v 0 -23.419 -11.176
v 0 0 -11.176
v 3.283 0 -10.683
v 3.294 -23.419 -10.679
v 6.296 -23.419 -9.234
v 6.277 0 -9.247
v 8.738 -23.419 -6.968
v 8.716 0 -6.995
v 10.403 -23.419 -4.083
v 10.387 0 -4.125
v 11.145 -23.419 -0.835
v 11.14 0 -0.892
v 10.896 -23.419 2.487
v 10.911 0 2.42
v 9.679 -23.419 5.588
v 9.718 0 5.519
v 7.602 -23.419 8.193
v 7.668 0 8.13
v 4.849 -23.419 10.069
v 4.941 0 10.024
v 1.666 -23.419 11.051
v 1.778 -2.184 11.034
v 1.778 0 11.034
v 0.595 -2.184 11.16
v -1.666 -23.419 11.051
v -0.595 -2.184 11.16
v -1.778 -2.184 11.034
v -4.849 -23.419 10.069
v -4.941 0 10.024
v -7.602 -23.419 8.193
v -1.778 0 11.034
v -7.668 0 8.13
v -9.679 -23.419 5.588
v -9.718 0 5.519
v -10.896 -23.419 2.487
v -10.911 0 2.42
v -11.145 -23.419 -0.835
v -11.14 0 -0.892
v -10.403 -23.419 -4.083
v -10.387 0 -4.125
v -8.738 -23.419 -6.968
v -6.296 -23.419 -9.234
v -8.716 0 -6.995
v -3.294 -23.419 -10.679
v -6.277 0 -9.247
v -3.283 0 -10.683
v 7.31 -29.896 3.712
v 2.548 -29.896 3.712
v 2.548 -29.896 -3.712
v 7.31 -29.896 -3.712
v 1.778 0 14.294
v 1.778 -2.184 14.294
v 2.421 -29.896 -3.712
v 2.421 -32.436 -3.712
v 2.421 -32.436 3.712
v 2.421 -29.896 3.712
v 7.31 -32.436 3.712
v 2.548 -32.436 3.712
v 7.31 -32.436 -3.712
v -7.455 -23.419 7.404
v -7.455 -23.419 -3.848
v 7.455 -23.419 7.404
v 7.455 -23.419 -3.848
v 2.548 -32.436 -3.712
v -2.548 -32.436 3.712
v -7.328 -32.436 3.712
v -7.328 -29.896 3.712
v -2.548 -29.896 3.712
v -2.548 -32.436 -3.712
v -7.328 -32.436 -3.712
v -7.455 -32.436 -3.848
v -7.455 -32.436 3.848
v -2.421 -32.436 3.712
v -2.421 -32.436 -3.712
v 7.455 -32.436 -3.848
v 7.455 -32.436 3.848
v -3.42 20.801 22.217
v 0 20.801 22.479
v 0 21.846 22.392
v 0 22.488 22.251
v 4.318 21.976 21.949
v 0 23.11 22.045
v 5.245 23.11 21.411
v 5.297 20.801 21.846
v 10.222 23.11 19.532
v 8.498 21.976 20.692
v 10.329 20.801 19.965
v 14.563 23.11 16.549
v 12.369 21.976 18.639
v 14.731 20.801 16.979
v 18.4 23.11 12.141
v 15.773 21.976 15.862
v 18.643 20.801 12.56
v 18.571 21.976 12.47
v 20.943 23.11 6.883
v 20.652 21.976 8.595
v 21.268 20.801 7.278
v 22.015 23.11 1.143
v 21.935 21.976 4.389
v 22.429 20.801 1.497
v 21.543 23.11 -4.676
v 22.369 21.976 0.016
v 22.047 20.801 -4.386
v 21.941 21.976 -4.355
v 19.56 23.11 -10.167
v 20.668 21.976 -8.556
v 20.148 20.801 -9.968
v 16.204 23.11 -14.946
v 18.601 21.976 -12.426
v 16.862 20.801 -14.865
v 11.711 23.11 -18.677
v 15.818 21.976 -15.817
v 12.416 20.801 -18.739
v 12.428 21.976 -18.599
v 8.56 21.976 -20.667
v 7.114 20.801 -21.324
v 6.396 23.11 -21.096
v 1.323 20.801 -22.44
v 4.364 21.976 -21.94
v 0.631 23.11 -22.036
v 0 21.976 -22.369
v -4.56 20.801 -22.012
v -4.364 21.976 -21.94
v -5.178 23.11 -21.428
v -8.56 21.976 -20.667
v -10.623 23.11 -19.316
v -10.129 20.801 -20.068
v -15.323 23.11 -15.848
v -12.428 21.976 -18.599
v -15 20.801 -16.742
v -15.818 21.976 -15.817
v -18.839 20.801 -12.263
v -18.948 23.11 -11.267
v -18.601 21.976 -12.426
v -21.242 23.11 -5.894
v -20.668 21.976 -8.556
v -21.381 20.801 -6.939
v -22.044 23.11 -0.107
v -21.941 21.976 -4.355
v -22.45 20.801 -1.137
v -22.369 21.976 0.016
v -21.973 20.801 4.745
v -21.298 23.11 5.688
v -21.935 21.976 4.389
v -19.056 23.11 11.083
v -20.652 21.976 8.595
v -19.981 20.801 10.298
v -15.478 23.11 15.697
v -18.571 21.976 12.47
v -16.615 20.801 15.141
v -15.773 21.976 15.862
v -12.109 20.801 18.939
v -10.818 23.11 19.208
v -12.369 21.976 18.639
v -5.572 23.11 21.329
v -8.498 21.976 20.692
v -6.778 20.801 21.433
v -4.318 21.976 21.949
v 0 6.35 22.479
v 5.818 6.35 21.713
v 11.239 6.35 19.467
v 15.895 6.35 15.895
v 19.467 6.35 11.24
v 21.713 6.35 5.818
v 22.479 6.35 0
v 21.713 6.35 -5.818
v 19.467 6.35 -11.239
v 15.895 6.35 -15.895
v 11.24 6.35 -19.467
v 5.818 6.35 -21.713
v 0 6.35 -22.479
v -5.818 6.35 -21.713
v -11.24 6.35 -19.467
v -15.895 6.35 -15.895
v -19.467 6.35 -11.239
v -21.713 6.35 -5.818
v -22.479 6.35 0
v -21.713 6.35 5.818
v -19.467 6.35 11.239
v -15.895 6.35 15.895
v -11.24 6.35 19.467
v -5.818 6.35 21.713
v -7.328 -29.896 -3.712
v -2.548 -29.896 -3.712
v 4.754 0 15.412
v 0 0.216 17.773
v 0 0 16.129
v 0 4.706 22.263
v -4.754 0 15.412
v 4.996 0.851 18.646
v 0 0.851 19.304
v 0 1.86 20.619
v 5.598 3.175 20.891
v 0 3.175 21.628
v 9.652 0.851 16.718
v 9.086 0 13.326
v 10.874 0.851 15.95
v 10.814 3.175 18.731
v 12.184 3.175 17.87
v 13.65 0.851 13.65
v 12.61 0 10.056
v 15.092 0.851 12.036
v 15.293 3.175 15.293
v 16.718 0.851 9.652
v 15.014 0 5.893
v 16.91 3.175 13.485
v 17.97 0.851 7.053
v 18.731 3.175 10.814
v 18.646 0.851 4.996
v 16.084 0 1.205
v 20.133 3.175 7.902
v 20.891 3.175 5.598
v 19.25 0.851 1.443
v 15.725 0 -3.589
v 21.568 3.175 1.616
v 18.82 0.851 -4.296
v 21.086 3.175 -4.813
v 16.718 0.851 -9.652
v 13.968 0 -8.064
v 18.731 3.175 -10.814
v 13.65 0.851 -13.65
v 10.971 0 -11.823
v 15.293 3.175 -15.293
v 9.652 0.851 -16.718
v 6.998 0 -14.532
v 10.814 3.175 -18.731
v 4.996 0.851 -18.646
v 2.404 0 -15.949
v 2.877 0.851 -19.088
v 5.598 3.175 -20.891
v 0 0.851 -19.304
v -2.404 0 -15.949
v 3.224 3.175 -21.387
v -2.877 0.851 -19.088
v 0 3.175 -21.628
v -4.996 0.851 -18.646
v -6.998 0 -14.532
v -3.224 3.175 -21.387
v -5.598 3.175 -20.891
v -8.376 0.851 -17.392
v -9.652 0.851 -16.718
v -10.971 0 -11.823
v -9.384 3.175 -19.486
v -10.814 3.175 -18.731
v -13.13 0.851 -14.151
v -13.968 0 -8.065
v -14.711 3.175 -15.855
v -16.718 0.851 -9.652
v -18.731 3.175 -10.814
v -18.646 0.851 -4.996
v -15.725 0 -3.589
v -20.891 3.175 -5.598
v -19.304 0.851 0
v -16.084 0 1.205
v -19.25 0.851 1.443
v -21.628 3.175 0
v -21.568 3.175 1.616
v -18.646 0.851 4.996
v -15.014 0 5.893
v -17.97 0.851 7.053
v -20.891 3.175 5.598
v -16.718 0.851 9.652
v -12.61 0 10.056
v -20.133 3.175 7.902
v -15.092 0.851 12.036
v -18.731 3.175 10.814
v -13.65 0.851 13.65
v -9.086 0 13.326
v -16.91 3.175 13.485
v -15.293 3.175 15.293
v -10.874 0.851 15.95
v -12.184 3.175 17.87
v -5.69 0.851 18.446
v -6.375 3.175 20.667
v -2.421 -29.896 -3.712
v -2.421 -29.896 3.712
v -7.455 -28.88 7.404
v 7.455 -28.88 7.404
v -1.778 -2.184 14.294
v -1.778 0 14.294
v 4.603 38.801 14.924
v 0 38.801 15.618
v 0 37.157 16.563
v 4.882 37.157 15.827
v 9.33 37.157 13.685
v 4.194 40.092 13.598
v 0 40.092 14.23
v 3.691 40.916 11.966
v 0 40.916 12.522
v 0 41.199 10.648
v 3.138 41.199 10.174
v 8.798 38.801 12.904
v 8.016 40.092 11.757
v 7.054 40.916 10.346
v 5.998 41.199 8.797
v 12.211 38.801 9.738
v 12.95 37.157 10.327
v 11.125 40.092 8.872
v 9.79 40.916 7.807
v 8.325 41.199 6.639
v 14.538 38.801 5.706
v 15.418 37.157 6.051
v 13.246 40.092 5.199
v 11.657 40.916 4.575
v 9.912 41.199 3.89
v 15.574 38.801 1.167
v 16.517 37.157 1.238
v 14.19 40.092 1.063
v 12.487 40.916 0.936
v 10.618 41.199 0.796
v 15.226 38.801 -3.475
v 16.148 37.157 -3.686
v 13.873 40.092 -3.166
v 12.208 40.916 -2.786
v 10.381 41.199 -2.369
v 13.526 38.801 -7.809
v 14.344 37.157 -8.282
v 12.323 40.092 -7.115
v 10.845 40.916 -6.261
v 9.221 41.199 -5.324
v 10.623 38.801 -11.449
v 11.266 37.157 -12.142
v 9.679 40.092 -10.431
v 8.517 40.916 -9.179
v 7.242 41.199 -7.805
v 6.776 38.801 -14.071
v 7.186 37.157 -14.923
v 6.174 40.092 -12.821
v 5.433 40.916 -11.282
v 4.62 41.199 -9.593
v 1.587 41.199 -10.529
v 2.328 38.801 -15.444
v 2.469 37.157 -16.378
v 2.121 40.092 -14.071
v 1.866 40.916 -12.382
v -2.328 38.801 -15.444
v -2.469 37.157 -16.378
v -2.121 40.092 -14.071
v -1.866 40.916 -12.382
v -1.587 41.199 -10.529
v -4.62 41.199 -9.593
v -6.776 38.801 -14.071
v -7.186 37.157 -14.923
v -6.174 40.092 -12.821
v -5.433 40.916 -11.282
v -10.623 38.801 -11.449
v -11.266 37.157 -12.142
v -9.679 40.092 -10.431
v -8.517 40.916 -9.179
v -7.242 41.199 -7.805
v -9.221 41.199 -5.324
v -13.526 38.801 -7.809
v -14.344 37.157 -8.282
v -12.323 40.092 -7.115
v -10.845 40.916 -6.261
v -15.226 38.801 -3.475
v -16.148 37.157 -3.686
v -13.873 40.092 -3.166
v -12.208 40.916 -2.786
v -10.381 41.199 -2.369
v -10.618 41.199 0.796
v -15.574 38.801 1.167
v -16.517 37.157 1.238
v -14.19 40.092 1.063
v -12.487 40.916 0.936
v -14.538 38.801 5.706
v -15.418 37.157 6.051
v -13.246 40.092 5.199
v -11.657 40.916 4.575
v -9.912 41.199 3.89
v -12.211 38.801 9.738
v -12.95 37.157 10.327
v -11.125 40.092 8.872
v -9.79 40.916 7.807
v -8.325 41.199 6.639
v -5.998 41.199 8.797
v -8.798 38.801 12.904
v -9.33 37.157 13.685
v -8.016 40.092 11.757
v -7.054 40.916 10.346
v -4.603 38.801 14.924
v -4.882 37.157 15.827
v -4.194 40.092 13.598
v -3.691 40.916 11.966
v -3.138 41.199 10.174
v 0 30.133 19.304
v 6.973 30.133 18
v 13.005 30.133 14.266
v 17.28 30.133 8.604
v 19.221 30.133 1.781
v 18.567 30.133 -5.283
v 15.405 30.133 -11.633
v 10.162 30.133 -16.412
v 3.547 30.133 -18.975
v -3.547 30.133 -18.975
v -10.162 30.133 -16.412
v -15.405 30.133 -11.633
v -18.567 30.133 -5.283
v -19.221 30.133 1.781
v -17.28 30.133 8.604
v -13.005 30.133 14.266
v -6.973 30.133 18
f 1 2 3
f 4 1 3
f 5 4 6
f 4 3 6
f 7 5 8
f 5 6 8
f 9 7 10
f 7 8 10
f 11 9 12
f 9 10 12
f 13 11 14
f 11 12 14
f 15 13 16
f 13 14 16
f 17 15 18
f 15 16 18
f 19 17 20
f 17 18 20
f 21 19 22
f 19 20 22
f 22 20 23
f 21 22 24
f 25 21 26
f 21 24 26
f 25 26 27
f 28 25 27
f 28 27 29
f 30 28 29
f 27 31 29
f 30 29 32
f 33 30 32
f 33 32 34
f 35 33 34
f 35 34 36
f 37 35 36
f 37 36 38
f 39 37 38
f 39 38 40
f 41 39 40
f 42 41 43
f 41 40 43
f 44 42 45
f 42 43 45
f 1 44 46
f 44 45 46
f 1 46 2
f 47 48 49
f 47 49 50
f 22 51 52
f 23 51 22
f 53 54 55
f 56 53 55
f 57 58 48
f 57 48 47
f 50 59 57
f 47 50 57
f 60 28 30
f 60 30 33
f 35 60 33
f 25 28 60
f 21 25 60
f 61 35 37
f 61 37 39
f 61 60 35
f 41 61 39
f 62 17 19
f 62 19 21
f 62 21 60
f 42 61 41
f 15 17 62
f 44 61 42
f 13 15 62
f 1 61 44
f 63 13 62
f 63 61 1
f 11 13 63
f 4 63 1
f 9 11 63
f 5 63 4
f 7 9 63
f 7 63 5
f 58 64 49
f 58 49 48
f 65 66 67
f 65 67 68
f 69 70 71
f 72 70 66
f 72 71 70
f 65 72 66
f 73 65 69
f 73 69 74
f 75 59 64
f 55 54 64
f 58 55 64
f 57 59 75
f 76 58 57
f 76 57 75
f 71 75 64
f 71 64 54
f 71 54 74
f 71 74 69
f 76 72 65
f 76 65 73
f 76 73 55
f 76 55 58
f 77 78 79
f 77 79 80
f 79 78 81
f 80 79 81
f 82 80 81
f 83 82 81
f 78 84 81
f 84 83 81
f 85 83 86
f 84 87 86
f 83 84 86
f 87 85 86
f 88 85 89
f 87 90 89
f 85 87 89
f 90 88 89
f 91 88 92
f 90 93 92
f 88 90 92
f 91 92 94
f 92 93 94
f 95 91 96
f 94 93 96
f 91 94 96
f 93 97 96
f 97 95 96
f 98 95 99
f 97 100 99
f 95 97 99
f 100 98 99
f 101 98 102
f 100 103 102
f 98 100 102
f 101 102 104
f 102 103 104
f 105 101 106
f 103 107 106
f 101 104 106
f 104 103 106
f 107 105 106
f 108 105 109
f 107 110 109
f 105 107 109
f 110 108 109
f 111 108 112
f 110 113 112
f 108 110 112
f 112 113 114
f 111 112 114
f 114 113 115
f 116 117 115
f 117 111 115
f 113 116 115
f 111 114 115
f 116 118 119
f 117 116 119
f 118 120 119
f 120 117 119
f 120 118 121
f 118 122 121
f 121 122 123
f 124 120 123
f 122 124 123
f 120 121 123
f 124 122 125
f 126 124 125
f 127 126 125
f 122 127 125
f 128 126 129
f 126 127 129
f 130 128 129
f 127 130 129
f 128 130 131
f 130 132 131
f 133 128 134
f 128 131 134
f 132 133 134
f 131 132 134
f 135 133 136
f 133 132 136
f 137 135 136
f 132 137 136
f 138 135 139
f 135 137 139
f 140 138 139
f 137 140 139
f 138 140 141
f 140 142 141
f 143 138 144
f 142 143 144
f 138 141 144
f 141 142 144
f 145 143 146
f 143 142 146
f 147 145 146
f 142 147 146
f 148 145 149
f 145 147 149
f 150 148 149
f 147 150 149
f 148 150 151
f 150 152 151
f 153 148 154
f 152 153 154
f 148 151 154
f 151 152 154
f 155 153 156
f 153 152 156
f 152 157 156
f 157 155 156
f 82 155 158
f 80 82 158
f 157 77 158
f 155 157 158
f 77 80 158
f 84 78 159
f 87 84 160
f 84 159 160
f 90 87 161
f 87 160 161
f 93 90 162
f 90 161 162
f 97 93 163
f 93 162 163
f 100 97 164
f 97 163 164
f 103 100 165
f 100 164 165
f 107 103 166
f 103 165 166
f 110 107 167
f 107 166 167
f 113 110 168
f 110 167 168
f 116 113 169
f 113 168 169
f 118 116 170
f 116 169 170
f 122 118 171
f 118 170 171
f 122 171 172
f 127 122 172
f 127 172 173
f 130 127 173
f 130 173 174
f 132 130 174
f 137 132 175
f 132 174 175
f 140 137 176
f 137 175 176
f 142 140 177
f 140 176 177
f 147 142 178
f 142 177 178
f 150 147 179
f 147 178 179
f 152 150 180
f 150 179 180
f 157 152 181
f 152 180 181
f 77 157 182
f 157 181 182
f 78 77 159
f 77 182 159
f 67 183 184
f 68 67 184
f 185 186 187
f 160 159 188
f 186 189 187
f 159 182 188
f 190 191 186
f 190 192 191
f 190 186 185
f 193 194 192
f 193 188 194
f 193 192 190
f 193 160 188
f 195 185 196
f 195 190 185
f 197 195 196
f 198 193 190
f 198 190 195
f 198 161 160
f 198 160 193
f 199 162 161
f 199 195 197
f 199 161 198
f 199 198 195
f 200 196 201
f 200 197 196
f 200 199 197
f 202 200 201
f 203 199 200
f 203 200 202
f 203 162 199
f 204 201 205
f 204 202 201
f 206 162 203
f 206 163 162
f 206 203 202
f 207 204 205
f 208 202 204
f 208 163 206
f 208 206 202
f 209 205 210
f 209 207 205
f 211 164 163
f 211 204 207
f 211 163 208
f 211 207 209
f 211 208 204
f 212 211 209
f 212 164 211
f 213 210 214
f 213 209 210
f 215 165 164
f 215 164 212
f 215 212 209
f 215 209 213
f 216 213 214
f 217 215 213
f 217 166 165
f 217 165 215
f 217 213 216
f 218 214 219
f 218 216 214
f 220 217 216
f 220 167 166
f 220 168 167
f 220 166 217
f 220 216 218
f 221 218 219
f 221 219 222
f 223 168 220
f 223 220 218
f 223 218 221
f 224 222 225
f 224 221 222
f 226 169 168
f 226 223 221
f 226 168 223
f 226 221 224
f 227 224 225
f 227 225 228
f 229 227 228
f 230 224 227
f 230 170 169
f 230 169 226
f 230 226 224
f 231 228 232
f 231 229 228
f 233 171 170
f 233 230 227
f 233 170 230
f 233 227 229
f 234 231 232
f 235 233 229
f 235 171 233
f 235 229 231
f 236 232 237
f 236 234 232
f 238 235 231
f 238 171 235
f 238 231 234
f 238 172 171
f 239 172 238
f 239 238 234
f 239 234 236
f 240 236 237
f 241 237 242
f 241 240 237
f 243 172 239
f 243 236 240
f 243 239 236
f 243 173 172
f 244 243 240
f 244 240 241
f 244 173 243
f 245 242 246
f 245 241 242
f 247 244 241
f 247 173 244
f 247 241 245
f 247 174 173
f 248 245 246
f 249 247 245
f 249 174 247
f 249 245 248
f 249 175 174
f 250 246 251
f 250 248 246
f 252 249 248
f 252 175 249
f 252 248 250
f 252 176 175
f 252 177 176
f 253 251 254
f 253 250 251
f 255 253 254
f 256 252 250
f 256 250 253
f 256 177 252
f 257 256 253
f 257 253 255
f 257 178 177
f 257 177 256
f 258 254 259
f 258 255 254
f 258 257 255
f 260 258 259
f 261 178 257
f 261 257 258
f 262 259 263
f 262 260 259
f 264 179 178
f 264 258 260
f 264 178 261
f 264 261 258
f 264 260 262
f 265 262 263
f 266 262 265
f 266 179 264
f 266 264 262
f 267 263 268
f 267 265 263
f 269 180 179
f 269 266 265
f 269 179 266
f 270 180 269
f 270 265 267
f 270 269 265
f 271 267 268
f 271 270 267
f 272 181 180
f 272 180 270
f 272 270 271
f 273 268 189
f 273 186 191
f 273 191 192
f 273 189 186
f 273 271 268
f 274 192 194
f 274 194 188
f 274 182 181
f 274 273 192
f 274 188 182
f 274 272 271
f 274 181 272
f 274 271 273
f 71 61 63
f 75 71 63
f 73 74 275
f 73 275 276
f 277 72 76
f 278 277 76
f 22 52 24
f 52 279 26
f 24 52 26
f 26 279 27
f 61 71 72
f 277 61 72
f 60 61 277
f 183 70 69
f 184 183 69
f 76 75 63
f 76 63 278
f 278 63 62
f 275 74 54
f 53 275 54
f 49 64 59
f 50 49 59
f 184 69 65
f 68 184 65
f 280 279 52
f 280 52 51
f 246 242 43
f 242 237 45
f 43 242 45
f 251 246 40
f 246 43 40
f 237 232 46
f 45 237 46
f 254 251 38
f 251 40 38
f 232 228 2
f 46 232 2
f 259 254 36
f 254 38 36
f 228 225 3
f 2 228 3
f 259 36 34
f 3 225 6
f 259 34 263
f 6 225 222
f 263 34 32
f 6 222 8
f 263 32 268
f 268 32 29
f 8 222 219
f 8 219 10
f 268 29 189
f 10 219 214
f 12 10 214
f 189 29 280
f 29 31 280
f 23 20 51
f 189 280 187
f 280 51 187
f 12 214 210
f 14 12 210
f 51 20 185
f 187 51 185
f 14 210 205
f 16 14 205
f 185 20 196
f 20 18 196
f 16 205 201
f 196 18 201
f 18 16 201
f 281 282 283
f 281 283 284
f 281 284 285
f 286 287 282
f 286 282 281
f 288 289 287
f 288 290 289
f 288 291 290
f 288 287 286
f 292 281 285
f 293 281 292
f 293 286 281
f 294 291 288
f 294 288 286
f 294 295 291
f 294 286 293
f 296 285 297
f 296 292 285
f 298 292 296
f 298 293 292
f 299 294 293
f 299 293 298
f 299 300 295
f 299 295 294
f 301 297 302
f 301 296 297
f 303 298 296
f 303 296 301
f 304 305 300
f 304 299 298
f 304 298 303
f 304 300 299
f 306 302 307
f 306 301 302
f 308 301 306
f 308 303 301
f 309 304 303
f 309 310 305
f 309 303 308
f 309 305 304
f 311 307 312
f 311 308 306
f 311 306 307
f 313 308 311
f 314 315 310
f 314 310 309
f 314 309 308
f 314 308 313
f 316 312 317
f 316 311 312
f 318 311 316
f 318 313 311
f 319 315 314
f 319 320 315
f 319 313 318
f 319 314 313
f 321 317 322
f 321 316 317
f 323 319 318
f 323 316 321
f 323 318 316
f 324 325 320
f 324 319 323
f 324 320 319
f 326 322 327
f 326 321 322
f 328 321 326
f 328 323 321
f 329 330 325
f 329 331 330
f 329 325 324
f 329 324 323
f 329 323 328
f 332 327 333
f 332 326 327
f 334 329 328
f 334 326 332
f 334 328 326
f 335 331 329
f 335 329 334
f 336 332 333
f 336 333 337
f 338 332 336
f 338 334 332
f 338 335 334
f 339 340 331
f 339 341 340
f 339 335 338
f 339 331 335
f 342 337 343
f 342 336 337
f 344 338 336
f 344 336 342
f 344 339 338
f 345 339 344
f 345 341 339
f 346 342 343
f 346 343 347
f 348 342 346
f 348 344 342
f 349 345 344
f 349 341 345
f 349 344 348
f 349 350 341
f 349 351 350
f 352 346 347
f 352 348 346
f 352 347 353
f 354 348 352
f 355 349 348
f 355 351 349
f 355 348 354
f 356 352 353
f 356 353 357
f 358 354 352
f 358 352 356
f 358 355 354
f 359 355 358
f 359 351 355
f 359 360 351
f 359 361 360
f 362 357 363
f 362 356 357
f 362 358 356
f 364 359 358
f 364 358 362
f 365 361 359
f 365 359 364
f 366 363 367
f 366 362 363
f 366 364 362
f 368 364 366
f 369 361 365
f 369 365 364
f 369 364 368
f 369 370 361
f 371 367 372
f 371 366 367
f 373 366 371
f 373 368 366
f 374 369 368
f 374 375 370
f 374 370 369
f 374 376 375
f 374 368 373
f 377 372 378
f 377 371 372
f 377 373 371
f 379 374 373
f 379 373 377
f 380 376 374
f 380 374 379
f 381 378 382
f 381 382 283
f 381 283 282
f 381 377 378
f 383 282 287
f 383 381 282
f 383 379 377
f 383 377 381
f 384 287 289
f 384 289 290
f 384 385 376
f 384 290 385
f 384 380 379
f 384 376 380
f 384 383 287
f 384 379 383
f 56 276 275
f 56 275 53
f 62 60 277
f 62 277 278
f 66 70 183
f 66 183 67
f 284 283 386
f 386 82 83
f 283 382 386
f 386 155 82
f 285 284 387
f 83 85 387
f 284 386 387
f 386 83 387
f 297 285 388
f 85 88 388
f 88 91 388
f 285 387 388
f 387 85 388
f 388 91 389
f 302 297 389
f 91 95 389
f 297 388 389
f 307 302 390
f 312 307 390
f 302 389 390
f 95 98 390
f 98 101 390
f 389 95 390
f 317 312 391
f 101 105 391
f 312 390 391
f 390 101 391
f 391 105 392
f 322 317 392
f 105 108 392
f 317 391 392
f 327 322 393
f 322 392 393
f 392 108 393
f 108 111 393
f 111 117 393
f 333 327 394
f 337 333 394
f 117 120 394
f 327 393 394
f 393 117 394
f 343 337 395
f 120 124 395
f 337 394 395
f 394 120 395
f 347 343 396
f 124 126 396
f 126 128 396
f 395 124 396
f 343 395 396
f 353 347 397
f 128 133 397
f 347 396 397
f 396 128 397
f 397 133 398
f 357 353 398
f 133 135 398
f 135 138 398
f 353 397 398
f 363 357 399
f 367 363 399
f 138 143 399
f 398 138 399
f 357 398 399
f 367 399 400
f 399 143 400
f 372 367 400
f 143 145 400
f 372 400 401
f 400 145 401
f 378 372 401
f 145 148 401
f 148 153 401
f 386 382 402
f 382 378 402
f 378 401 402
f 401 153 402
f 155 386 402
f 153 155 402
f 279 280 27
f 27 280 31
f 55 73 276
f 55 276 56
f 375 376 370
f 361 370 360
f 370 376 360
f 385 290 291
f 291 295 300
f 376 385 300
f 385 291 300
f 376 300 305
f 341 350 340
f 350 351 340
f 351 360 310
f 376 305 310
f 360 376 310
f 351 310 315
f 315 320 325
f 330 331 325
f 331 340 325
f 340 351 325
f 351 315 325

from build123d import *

# Parameters (mm, degrees)
SKETCH2_R           = 11.176
BOSS_EXTRUDE1_DEPTH = 23.4188
SKETCH3_W           = 14.9098
SKETCH3_H           = 11.2522
BOSS_EXTRUDE2_DEPTH = 9.017
SKETCH4_W           = 4.842933334
SKETCH4_H           = 7.423880536
CUT_EXTRUDE1_DEPTH  = 2.54
SKETCH5_W           = 4.779433333
SKETCH5_H           = 7.423880536
CUT_EXTRUDE2_DEPTH  = 2.54
SKETCH6_W           = 4.761113869
SKETCH6_H           = 7.423880536
CUT_EXTRUDE3_DEPTH  = 2.54
RIB1_START          = -1.778
RIB1_OUTLINE_W      = 3.294408818
RIB1_OUTLINE_H      = 2.1844
RIB1_DEPTH          = 3.556
CHAMFER1_SIZE       = 3.556
FILLET1_R           = 6.35


# Read off the part's stored shape, not the designer's step: Rib1
with BuildPart() as part:
    # Sketch1 → Revolve1 (revolve)
    with BuildSketch(Plane(origin=(0, 0, 0), x_dir=(-1, 0, 0), z_dir=(0, 0, -1)), mode=Mode.PRIVATE) as revolve1_sk:
        Polygon((-22.479, 0), (0, 0), (0, 41.1988), (-14.986000072, 41.1988), (-22.479, 21.996399801), align=None)
    revolve(revolve1_sk.sketch.rotate(Axis((0, 0, 0), (0, 1, 0)), 270), axis=Axis((0, 0, 0), (0, 1, 0)))

    # Sketch2 → Boss-Extrude1 (add)
    with BuildSketch(Plane.XZ):
        with Locations(Location((0, 0, 0), (0, 0, 270))):
            Circle(SKETCH2_R)
    extrude(amount=BOSS_EXTRUDE1_DEPTH)

    # Sketch3 → Boss-Extrude2 (add)
    with BuildSketch(Plane.XZ.offset(23.4188)):
        with Locations((0, 1.778)):
            Rectangle(SKETCH3_W, SKETCH3_H)
    extrude(amount=BOSS_EXTRUDE2_DEPTH)

    # Sketch4 → Cut-Extrude1 (cut)
    with BuildSketch(Plane.XZ.offset(32.4358)):
        Rectangle(SKETCH4_W, SKETCH4_H)
    extrude(amount=-CUT_EXTRUDE1_DEPTH, mode=Mode.SUBTRACT)

    # Sketch5 → Cut-Extrude2 (cut)
    with BuildSketch(Plane.XZ.offset(32.4358)):
        with Locations((-4.938183334, 0)):
            Rectangle(SKETCH5_W, SKETCH5_H)
    extrude(amount=-CUT_EXTRUDE2_DEPTH, mode=Mode.SUBTRACT)

    # Sketch6 → Cut-Extrude3 (cut)
    with BuildSketch(Plane.XZ.offset(32.4358)):
        with Locations((4.929023601, 0)):
            Rectangle(SKETCH6_W, SKETCH6_H)
    extrude(amount=-CUT_EXTRUDE3_DEPTH, mode=Mode.SUBTRACT)

    # Rib1 outline → Rib1 (add)
    with BuildSketch(Plane(origin=(0, 0, 0), x_dir=(0, 0, -1), z_dir=(1, 0, 0)).offset(RIB1_START)):
        with Locations((-12.647204409, -1.0922)):
            Rectangle(RIB1_OUTLINE_W, RIB1_OUTLINE_H)
    extrude(amount=RIB1_DEPTH)

    # Chamfer1
    chamfer1_edges = [part.edges().sort_by_distance(p)[0] for p in [
        (0, -32.4358, 7.4041),
    ]]
    chamfer(chamfer1_edges, length=CHAMFER1_SIZE)

    # Fillet1
    fillet1_edges = [part.edges().sort_by_distance(p)[0] for p in [
        (0, 21.996399801, -22.479),
        (0, 41.1988, -14.986000072),
        (0, 0, -22.479),
    ]]
    fillet(fillet1_edges, radius=FILLET1_R)


solid = part.part
